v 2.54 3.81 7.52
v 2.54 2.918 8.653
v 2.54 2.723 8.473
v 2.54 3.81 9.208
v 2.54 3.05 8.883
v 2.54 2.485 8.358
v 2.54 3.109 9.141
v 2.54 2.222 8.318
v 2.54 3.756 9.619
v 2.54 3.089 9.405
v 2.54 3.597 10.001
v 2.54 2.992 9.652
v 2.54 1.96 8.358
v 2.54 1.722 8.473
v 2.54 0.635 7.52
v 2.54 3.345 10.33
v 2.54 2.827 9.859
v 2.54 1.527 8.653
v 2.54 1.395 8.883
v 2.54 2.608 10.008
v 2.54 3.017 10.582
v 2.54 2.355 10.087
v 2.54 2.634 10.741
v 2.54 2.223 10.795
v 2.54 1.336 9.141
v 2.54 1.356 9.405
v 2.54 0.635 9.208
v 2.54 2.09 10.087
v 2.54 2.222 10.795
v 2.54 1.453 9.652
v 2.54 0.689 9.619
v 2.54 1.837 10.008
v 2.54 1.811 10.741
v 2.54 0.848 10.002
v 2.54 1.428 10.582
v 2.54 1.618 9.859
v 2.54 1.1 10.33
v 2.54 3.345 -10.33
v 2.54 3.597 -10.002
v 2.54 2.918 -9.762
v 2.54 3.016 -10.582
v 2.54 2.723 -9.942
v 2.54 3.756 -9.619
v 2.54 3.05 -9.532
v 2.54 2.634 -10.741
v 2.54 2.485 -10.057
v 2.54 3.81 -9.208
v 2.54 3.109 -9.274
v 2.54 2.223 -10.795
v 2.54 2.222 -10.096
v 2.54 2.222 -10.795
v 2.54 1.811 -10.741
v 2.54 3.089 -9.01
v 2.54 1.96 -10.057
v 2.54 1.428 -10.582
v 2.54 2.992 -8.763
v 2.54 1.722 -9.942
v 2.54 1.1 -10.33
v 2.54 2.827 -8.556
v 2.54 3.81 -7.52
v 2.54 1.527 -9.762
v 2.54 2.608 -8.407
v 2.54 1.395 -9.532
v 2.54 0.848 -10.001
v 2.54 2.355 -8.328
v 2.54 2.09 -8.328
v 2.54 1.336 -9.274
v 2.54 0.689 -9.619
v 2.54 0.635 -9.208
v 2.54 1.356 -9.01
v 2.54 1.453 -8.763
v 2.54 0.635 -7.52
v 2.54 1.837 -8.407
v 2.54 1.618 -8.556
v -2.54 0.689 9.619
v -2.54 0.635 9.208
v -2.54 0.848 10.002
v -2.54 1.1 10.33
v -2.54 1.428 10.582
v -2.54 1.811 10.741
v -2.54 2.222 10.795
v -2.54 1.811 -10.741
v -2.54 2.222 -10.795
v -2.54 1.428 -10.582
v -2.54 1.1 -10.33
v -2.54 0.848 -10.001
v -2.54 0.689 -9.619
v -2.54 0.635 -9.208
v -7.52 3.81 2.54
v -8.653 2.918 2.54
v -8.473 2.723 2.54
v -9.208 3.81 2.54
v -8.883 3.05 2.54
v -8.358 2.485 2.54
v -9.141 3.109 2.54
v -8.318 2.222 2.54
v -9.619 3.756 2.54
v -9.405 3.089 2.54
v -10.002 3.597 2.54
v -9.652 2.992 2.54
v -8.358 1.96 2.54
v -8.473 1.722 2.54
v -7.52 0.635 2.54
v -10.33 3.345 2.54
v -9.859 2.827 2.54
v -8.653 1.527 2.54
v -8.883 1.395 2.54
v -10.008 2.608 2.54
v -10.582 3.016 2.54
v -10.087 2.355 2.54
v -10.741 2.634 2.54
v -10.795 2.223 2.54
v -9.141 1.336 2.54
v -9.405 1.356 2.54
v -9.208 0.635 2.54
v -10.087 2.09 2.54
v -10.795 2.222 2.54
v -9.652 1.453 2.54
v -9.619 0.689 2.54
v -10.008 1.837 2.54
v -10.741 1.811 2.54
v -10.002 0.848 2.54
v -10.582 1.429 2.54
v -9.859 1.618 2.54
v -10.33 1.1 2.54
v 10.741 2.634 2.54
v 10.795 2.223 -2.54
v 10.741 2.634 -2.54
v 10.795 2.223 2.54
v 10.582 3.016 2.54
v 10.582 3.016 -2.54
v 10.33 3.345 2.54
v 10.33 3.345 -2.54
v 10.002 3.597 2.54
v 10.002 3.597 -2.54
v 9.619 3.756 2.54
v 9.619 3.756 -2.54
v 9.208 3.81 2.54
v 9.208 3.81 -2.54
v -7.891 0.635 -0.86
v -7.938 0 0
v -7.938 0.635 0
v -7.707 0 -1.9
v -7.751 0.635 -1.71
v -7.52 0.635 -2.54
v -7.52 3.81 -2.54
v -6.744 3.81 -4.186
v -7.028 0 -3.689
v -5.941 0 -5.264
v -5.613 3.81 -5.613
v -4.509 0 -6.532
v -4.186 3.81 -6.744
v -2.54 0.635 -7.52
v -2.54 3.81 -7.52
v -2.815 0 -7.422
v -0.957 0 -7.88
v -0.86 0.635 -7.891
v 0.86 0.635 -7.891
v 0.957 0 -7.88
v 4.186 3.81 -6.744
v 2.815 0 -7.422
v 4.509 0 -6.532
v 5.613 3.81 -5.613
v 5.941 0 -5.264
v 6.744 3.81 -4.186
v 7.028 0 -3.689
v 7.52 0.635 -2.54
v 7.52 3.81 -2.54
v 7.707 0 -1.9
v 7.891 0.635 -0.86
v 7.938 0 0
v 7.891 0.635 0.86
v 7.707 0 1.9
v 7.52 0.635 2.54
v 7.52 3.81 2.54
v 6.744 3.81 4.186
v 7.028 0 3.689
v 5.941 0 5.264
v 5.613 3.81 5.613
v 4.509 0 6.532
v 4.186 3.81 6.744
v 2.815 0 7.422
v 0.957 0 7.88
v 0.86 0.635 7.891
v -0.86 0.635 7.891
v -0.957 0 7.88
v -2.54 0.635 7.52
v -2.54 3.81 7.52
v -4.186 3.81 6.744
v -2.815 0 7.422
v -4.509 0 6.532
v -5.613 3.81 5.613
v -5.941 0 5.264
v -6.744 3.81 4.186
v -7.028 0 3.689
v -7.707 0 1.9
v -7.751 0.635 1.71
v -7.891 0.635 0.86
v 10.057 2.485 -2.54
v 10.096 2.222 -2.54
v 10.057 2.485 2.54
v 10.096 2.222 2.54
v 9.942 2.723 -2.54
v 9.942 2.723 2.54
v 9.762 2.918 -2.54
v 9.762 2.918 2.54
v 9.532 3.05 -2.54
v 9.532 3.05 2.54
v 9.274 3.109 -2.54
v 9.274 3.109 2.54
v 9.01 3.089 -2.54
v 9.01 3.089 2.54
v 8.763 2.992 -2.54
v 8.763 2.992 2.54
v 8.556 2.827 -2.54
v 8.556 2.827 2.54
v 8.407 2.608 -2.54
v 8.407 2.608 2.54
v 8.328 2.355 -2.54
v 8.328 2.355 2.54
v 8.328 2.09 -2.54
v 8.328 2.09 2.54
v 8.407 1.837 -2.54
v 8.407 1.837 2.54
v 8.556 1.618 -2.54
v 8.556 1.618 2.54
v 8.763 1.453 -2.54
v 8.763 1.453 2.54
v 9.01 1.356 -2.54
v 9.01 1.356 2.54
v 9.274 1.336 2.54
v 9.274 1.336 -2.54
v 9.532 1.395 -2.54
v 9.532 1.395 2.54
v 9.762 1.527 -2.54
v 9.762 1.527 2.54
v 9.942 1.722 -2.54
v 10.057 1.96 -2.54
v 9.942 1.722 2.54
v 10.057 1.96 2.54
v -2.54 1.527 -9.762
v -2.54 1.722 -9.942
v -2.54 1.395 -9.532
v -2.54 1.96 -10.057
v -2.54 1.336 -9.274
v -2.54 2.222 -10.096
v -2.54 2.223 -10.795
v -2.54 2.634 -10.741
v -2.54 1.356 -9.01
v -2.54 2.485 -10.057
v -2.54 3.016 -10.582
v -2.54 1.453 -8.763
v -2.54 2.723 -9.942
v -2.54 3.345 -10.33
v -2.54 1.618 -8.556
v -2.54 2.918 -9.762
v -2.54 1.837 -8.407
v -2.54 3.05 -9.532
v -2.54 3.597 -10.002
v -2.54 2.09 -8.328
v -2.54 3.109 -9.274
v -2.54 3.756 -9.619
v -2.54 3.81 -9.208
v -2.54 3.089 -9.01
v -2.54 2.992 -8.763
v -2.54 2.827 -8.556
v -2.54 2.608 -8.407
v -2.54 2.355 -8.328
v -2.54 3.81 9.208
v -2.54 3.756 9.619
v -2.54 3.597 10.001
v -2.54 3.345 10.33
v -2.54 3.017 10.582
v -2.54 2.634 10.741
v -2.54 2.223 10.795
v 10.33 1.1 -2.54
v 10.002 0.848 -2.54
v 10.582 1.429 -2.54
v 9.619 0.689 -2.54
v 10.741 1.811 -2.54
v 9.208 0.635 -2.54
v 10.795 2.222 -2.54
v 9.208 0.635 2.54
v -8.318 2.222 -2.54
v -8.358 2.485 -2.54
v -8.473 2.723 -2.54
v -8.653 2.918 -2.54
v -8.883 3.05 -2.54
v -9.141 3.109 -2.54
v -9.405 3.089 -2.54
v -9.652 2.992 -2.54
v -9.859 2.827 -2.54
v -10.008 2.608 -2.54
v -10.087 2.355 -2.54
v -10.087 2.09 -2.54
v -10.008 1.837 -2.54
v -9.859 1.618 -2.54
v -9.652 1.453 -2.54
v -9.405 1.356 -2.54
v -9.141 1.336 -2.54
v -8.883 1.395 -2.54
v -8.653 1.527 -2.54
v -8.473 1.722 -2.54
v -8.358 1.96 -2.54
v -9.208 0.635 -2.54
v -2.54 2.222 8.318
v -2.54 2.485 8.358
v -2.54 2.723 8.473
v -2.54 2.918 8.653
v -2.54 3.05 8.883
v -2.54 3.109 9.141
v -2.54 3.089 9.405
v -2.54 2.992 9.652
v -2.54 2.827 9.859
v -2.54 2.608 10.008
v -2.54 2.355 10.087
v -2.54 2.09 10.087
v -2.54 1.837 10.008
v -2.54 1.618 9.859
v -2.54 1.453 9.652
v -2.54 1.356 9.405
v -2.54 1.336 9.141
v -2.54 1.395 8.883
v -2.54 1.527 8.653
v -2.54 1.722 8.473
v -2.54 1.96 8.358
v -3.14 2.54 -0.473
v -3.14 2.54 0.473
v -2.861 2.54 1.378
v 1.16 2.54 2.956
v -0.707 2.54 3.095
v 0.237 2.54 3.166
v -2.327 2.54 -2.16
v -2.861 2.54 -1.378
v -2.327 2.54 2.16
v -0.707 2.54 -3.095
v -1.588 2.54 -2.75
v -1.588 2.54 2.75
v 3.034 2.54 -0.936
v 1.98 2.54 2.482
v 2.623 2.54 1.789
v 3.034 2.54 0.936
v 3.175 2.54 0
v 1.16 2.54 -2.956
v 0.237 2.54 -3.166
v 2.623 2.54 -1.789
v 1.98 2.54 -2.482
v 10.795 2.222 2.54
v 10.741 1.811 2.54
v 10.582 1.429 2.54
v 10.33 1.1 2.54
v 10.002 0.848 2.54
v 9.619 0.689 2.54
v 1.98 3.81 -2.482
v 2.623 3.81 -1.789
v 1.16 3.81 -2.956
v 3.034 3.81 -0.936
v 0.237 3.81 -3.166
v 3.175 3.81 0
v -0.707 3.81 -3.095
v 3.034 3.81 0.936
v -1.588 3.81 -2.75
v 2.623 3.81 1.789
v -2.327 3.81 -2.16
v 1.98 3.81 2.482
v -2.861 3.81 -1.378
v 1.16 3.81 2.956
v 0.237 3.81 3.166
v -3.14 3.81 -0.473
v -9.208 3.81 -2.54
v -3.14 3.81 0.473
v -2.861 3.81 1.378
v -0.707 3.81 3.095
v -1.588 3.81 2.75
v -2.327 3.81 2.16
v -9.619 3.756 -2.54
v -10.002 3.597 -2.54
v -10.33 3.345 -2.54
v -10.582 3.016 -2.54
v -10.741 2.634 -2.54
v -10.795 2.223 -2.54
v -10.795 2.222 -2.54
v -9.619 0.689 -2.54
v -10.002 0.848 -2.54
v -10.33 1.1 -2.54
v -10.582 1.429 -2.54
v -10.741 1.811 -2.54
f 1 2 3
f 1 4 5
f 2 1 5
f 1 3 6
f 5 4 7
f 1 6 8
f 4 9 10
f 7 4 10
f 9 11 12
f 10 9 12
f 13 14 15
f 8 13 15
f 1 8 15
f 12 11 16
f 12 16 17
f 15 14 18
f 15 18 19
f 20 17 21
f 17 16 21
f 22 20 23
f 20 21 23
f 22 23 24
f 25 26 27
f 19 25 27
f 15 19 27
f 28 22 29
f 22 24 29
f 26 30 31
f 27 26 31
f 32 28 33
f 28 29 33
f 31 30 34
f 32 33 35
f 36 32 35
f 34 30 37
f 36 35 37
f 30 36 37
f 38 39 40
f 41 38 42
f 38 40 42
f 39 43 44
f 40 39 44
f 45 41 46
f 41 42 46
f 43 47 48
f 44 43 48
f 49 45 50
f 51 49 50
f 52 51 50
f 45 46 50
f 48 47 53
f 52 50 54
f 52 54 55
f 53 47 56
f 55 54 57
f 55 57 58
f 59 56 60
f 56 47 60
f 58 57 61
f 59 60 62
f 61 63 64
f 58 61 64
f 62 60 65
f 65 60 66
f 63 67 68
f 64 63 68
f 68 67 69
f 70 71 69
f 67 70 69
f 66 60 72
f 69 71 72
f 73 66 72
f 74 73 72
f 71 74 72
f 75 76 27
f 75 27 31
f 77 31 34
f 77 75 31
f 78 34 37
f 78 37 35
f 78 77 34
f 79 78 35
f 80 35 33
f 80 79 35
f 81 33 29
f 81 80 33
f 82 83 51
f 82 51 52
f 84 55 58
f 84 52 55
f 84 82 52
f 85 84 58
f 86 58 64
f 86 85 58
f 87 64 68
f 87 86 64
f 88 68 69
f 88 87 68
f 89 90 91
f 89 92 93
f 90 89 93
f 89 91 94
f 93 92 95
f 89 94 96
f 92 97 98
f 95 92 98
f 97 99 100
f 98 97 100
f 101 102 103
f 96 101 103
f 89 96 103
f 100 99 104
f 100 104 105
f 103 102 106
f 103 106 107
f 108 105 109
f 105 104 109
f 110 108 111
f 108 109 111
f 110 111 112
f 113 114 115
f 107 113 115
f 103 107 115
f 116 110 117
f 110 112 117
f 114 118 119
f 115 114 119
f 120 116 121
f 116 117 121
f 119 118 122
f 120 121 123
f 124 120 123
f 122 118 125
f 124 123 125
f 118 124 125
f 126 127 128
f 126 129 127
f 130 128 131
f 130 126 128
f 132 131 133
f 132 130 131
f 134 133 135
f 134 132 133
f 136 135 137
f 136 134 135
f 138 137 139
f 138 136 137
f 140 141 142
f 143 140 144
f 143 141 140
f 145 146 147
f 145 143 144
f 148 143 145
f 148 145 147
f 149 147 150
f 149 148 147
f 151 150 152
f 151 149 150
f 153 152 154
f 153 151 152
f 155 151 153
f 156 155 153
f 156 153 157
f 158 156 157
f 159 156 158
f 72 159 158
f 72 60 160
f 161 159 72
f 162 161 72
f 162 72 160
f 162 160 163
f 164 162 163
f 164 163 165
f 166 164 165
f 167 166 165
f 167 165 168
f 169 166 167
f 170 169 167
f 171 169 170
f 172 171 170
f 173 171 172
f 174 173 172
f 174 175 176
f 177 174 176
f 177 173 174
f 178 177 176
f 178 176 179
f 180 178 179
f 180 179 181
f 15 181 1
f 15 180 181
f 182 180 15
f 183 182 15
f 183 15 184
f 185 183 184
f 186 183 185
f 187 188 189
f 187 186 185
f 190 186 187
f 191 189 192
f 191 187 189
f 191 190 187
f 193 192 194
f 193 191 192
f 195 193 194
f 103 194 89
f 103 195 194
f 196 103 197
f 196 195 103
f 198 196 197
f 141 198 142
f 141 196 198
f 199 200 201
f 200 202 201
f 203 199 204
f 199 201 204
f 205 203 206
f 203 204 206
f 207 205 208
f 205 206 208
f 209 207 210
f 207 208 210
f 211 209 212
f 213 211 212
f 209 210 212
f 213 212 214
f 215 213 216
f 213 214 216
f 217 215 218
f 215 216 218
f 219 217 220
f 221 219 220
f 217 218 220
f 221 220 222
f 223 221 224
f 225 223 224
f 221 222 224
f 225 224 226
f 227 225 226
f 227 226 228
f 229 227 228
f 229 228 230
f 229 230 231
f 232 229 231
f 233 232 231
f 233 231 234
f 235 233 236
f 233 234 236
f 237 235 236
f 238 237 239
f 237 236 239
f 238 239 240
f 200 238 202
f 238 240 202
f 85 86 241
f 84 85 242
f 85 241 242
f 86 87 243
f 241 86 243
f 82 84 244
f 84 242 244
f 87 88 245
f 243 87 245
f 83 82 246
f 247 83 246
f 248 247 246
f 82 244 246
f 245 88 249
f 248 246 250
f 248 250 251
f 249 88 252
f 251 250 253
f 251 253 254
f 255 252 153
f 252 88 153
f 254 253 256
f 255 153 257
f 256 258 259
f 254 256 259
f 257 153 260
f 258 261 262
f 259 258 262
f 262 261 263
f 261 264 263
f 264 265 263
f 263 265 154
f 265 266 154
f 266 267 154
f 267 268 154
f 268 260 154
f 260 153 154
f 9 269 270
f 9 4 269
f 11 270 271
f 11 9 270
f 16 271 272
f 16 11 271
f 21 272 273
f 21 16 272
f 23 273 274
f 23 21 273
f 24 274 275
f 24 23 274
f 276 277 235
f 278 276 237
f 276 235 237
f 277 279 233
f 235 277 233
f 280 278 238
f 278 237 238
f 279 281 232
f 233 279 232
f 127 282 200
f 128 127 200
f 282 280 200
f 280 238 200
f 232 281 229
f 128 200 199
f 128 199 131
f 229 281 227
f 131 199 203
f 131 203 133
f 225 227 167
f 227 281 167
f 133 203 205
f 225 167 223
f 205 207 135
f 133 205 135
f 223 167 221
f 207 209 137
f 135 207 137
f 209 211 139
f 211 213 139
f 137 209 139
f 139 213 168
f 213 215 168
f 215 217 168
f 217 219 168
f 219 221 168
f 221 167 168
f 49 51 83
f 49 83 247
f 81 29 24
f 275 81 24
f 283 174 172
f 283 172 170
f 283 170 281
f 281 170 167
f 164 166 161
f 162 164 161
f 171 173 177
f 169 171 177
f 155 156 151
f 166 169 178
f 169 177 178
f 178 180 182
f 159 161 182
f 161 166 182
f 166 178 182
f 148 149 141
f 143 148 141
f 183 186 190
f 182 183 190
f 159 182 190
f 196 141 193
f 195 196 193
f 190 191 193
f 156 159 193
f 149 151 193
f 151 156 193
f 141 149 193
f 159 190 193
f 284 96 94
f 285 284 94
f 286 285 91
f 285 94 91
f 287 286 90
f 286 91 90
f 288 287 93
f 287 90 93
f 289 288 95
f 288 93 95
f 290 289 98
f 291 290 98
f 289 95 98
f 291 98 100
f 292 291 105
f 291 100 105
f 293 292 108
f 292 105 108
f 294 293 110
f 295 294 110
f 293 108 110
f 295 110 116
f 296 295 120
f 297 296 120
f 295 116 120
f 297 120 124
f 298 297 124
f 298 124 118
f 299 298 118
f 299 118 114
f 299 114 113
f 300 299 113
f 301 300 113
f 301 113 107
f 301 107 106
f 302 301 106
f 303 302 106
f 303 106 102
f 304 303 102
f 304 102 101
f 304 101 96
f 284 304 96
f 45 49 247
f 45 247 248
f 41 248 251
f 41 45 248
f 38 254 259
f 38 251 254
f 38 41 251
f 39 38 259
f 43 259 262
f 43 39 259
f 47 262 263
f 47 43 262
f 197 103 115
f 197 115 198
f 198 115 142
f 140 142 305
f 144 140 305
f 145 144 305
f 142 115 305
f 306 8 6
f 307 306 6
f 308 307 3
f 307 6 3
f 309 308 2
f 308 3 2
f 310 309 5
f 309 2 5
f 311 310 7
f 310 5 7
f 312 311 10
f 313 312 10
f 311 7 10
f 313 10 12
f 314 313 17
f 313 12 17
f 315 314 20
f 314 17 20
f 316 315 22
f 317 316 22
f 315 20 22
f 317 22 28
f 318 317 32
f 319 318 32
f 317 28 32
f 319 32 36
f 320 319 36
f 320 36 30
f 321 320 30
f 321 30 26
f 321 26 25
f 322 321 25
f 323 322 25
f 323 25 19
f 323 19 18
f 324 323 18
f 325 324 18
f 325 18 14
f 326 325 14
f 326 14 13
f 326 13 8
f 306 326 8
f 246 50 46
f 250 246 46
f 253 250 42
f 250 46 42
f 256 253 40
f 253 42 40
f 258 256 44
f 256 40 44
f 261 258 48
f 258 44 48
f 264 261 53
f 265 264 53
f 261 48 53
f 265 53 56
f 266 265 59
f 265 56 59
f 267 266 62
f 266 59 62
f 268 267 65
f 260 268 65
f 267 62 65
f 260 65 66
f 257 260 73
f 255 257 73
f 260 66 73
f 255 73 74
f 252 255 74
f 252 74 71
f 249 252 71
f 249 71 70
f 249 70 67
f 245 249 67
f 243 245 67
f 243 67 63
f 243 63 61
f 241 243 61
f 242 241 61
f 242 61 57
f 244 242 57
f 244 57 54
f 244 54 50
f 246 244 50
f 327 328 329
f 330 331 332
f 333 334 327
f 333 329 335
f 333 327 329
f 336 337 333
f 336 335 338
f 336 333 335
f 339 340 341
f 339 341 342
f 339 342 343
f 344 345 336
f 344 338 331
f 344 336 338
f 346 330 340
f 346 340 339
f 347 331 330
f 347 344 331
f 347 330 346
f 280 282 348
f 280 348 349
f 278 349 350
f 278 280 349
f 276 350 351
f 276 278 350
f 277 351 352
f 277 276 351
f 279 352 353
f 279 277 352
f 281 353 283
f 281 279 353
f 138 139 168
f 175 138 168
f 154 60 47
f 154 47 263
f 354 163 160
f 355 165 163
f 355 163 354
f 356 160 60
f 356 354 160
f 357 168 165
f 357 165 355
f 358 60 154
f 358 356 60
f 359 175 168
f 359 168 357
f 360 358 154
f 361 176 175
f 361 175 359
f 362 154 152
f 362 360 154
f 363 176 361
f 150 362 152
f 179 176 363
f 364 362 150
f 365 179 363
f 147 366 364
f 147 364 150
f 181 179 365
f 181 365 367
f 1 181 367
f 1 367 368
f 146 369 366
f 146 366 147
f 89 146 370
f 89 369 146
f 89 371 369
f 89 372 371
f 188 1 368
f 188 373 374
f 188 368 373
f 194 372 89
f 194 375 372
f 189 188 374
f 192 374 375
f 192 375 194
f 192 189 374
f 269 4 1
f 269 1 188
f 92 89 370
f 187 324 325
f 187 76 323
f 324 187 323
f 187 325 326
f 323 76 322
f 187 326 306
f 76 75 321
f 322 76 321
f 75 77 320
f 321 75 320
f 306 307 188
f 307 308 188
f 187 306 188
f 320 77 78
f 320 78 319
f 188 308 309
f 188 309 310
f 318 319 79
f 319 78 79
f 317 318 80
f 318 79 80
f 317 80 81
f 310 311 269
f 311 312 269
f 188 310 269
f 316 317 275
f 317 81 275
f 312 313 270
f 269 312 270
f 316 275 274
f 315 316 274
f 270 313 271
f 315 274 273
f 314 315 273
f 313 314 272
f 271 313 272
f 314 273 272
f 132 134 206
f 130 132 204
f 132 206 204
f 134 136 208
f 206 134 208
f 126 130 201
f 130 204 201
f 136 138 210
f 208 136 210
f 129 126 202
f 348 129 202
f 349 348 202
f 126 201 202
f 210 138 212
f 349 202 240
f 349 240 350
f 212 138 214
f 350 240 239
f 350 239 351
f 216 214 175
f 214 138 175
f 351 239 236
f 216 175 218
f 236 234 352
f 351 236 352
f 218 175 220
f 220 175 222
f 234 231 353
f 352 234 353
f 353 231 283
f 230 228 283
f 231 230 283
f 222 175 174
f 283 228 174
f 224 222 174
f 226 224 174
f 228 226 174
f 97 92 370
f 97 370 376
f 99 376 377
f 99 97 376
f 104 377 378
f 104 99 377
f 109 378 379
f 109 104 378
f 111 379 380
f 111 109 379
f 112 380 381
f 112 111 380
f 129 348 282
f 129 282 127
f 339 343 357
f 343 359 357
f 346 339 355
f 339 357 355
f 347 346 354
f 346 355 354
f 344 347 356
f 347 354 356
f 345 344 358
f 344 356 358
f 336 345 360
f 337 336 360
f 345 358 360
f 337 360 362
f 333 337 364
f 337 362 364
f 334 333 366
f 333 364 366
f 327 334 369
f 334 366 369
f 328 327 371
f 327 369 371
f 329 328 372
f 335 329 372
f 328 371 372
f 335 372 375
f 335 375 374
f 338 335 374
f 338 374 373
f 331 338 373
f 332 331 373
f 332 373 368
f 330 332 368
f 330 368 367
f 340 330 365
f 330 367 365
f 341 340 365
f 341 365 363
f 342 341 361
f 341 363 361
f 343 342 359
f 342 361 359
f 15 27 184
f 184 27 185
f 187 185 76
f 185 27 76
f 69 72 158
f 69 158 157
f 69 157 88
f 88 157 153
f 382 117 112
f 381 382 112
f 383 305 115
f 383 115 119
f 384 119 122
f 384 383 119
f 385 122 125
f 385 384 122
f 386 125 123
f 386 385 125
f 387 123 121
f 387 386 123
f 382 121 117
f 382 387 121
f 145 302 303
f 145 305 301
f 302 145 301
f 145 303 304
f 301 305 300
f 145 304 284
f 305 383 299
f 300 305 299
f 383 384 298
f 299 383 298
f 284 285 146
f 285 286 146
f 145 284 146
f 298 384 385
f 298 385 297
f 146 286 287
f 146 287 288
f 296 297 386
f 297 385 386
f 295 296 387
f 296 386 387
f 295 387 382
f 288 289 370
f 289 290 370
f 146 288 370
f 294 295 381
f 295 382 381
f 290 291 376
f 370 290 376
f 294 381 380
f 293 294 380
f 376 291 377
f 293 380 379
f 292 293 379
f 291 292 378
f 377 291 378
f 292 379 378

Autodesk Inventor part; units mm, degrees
ref_plane "YZ Plane" through (0, 0, 0) normal (1, 0, 0) x (0, 1, 0)
ref_plane "XZ Plane" through (0, 0, 0) normal (0, 1, 0) x (-1, 0, 0)
ref_plane "XY Plane" through (0, 0, 0) normal (0, 0, 1) x (1, 0, 0)
sketch "Sketch1" plane through (0, 0, 0) normal (0, 1, 0) x (-1, 0, 0)
  circle A0 centre (0, 0) radius 7.9375
  dimension "d0" = 15.875
extrude "Extrusion1" add sketch "Sketch1" along normal blind 3.81
sketch "Sketch2" plane through (0, 3.81, 0) normal (0, 1, 0) x (1, 0, 0)
  circle A0 centre (0, 0) radius 3.175
  dimension "d3" = 6.35
sketch "Sketch3" plane through (0, 0, 0) normal (1, 0, 0) x (0, 1, 0)
  line L0 (0.635, -2.54) -> (3.81, -2.54)
  line L1 (3.81, -2.54) -> (3.81, 2.54)
  line L2 (3.81, 2.54) -> (0.635, 2.54)
  line L3 (3.81, -7.9375) -> (3.81, 7.9375) projected
  line L4 (0.635, 2.54) -> (0.635, -2.54)
  point P0 (0, 0)
  dimension "d9" = 3.175
  dimension "d20" = 3.175
extrude "Extrusion3" add sketch "Sketch3" along normal mid plane 21.59
fillet "Fillet1" radius 1.5875 4 edges at (10.795, 3.81, 0) (-10.795, 3.81, 0) (10.795, 0.635, 0) (-10.795, 0.635, 0)
sketch "Sketch6" plane through (-7.5201, 0.635, 2.54) normal (0, 0, 1) x (1, 0, 0)
  arc A0 (-1.6874, 3.175) -> (-1.6874, 0) centre (-1.6874, 1.5875) ccw projected
  circle A1 centre (-1.6874, 1.5875) radius 0.889
  arc A2 (16.7276, 0) -> (16.7276, 3.175) centre (16.7276, 1.5875) ccw projected
  circle A3 centre (16.7276, 1.5875) radius 0.889
  point P0 (7.5201, -0.635)
  dimension "d25" = 1.778
  dimension "d26" = 1.778
extrude "Extrusion7" cut sketch "Sketch6" against normal through all
pattern_circular "Circular Pattern3" count 2 over 90 about axis through (0, 0, 0) along (0, 1, 0) of "Extrusion3", "Fillet1", "Extrusion7"
extrude "Extrusion8" cut sketch "Sketch2" against normal blind 1.27
properties part number "scrambler_vertical_cap"
